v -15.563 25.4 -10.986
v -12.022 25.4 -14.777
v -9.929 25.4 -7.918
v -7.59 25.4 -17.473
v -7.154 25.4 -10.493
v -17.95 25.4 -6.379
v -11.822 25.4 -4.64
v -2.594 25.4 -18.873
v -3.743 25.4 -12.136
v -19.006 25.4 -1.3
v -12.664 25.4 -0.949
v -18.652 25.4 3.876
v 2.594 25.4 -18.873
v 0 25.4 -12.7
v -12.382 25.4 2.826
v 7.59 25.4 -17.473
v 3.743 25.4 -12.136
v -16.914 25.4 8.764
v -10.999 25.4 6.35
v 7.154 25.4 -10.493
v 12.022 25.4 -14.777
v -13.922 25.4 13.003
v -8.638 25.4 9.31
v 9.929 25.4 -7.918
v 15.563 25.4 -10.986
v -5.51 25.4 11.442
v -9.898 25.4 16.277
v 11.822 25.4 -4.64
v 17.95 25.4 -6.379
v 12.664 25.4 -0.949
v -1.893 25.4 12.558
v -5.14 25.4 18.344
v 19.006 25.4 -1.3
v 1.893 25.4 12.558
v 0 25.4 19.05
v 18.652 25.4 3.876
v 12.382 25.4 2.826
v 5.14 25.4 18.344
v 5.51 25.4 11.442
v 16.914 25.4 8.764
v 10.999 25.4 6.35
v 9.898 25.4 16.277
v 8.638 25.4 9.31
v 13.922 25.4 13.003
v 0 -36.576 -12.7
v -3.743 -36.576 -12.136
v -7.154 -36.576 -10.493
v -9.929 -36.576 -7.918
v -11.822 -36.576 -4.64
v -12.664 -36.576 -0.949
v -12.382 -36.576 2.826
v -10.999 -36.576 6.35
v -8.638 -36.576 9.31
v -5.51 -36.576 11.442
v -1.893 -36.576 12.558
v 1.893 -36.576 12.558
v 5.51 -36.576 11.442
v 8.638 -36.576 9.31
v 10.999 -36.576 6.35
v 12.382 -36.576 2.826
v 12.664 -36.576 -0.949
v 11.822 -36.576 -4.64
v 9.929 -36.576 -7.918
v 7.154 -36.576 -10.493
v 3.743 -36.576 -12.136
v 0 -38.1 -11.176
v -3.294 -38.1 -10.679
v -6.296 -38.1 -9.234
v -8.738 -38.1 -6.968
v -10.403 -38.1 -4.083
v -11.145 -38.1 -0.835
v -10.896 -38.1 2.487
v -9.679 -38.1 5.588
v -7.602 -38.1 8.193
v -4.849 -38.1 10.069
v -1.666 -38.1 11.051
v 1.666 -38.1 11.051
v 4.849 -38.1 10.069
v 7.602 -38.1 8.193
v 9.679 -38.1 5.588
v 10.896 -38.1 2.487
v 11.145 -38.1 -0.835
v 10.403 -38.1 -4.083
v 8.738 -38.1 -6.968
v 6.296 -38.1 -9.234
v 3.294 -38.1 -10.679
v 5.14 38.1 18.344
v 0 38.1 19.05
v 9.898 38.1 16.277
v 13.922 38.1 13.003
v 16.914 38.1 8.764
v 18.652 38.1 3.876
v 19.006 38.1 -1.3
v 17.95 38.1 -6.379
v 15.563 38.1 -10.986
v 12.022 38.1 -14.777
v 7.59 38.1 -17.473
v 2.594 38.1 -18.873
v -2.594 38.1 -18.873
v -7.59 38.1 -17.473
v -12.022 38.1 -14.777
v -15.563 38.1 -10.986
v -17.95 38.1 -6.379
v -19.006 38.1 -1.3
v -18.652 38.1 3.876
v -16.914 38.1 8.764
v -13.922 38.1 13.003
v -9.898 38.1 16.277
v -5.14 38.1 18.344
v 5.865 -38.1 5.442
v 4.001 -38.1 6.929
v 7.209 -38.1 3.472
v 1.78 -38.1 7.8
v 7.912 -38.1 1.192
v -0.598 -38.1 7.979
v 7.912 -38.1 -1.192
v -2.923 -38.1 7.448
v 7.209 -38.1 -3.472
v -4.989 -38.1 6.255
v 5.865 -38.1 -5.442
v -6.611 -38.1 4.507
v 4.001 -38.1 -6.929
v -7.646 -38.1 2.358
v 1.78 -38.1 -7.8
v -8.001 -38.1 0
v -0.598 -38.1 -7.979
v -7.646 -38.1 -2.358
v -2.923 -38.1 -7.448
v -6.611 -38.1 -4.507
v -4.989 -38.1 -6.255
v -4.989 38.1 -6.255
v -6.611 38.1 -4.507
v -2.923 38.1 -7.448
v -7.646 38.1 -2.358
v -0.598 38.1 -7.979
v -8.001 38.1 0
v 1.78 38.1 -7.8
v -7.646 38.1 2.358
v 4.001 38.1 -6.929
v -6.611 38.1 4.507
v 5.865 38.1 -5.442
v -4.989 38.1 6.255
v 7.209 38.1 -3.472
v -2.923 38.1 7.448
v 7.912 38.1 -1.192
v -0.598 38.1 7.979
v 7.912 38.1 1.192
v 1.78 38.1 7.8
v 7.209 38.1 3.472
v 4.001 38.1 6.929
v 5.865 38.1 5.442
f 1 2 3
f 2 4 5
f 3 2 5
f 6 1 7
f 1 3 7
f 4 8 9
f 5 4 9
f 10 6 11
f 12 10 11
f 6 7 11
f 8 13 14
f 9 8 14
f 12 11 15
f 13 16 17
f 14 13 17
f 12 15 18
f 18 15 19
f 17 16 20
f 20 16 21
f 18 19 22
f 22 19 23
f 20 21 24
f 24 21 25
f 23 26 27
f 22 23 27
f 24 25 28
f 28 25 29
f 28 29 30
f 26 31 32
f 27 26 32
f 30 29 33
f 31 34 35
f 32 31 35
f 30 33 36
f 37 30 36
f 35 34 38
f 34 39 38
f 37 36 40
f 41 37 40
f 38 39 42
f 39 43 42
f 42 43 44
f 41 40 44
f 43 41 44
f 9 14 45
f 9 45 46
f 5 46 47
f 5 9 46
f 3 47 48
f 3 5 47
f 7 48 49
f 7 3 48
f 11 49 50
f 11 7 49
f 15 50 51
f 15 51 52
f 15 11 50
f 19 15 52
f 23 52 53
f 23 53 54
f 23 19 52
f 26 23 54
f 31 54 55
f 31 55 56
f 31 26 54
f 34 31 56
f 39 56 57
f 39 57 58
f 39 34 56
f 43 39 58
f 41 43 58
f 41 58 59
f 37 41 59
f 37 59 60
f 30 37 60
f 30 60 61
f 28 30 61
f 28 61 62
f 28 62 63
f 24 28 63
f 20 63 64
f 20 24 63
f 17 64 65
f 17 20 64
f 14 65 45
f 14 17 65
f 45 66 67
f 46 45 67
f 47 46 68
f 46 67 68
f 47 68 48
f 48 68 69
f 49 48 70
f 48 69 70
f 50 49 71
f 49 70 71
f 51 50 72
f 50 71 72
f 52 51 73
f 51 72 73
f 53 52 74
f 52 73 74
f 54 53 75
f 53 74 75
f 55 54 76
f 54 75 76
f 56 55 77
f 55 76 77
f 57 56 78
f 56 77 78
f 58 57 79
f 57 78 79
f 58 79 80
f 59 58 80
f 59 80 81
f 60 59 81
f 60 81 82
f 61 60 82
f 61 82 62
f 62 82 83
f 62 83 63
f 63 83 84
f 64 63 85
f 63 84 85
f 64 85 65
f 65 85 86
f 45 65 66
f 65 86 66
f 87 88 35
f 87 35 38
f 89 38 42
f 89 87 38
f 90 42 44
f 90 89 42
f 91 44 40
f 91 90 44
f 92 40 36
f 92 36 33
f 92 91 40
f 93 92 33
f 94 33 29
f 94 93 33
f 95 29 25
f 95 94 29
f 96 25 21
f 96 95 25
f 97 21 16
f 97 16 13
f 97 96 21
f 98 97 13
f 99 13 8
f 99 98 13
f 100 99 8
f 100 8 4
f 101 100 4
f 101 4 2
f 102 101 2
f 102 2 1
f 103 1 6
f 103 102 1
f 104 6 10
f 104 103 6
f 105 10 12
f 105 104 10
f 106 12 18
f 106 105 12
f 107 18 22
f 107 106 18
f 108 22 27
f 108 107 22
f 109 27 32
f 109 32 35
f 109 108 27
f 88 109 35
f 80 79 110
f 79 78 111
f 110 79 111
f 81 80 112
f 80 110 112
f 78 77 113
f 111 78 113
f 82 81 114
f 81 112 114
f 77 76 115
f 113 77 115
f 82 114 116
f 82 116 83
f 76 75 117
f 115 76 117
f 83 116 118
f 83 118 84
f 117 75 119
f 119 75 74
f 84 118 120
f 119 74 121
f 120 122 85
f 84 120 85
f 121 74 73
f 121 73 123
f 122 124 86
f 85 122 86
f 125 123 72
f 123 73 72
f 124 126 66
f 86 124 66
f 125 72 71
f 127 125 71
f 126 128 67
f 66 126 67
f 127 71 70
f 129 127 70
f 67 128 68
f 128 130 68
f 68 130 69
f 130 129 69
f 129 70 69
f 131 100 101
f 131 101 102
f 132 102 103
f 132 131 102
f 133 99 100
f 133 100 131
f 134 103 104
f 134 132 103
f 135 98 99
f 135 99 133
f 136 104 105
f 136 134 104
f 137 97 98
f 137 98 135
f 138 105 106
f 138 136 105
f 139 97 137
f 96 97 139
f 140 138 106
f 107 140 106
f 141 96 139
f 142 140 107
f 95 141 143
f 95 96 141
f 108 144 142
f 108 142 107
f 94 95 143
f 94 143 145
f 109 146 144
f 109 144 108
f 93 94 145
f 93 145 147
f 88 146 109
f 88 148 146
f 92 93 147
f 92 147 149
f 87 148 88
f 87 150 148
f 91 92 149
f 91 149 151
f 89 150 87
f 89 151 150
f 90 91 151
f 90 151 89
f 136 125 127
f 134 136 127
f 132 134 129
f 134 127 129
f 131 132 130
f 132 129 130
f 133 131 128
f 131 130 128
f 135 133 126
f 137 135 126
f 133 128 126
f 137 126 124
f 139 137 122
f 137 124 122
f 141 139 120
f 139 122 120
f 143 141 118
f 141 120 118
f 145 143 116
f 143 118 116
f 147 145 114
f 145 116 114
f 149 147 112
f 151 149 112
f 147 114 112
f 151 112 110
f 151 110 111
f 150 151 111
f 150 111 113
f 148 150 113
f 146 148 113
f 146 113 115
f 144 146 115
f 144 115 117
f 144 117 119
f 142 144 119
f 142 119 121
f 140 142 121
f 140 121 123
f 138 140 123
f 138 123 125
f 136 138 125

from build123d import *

# Parameters (mm, degrees)
SKETCH2_R           = 12.7
BOSS_EXTRUDE1_DEPTH = 38.1
SKETCH3_R           = 19.05
BOSS_EXTRUDE2_DEPTH = 12.7
HOLE1_D             = 16.002
CHAMFER1_SIZE       = 1.524


with BuildPart() as part:
    # Sketch2 → Boss-Extrude1 (new, symmetric)
    with BuildSketch(Plane(origin=(0, 0, 0), x_dir=(1, 0, 0), z_dir=(0, 1, 0))):
        with Locations(Location((0, 0, 0), (0, 0, 90))):
            Circle(SKETCH2_R)
    extrude(amount=BOSS_EXTRUDE1_DEPTH, both=True)

    # Sketch3 → Boss-Extrude2 (add)
    with BuildSketch(Plane(origin=(0, 38.1, 0), x_dir=(1, 0, 0), z_dir=(0, 1, 0))):
        with Locations(Location((0, 0, 0), (0, 0, 270))):
            Circle(SKETCH3_R)
    extrude(amount=-BOSS_EXTRUDE2_DEPTH)

    # Hole1 (through all)
    with Locations(Plane(origin=(0, 38.1, 0), x_dir=(1, 0, 0), z_dir=(0, 1, 0))):
        with Locations((0, 0)):
            Hole(HOLE1_D / 2)

    # Chamfer1
    chamfer1_edges = [part.edges().sort_by_distance(p)[0] for p in [
        (0, -38.1, 12.7),
    ]]
    chamfer(chamfer1_edges, length=CHAMFER1_SIZE)


solid = part.part
